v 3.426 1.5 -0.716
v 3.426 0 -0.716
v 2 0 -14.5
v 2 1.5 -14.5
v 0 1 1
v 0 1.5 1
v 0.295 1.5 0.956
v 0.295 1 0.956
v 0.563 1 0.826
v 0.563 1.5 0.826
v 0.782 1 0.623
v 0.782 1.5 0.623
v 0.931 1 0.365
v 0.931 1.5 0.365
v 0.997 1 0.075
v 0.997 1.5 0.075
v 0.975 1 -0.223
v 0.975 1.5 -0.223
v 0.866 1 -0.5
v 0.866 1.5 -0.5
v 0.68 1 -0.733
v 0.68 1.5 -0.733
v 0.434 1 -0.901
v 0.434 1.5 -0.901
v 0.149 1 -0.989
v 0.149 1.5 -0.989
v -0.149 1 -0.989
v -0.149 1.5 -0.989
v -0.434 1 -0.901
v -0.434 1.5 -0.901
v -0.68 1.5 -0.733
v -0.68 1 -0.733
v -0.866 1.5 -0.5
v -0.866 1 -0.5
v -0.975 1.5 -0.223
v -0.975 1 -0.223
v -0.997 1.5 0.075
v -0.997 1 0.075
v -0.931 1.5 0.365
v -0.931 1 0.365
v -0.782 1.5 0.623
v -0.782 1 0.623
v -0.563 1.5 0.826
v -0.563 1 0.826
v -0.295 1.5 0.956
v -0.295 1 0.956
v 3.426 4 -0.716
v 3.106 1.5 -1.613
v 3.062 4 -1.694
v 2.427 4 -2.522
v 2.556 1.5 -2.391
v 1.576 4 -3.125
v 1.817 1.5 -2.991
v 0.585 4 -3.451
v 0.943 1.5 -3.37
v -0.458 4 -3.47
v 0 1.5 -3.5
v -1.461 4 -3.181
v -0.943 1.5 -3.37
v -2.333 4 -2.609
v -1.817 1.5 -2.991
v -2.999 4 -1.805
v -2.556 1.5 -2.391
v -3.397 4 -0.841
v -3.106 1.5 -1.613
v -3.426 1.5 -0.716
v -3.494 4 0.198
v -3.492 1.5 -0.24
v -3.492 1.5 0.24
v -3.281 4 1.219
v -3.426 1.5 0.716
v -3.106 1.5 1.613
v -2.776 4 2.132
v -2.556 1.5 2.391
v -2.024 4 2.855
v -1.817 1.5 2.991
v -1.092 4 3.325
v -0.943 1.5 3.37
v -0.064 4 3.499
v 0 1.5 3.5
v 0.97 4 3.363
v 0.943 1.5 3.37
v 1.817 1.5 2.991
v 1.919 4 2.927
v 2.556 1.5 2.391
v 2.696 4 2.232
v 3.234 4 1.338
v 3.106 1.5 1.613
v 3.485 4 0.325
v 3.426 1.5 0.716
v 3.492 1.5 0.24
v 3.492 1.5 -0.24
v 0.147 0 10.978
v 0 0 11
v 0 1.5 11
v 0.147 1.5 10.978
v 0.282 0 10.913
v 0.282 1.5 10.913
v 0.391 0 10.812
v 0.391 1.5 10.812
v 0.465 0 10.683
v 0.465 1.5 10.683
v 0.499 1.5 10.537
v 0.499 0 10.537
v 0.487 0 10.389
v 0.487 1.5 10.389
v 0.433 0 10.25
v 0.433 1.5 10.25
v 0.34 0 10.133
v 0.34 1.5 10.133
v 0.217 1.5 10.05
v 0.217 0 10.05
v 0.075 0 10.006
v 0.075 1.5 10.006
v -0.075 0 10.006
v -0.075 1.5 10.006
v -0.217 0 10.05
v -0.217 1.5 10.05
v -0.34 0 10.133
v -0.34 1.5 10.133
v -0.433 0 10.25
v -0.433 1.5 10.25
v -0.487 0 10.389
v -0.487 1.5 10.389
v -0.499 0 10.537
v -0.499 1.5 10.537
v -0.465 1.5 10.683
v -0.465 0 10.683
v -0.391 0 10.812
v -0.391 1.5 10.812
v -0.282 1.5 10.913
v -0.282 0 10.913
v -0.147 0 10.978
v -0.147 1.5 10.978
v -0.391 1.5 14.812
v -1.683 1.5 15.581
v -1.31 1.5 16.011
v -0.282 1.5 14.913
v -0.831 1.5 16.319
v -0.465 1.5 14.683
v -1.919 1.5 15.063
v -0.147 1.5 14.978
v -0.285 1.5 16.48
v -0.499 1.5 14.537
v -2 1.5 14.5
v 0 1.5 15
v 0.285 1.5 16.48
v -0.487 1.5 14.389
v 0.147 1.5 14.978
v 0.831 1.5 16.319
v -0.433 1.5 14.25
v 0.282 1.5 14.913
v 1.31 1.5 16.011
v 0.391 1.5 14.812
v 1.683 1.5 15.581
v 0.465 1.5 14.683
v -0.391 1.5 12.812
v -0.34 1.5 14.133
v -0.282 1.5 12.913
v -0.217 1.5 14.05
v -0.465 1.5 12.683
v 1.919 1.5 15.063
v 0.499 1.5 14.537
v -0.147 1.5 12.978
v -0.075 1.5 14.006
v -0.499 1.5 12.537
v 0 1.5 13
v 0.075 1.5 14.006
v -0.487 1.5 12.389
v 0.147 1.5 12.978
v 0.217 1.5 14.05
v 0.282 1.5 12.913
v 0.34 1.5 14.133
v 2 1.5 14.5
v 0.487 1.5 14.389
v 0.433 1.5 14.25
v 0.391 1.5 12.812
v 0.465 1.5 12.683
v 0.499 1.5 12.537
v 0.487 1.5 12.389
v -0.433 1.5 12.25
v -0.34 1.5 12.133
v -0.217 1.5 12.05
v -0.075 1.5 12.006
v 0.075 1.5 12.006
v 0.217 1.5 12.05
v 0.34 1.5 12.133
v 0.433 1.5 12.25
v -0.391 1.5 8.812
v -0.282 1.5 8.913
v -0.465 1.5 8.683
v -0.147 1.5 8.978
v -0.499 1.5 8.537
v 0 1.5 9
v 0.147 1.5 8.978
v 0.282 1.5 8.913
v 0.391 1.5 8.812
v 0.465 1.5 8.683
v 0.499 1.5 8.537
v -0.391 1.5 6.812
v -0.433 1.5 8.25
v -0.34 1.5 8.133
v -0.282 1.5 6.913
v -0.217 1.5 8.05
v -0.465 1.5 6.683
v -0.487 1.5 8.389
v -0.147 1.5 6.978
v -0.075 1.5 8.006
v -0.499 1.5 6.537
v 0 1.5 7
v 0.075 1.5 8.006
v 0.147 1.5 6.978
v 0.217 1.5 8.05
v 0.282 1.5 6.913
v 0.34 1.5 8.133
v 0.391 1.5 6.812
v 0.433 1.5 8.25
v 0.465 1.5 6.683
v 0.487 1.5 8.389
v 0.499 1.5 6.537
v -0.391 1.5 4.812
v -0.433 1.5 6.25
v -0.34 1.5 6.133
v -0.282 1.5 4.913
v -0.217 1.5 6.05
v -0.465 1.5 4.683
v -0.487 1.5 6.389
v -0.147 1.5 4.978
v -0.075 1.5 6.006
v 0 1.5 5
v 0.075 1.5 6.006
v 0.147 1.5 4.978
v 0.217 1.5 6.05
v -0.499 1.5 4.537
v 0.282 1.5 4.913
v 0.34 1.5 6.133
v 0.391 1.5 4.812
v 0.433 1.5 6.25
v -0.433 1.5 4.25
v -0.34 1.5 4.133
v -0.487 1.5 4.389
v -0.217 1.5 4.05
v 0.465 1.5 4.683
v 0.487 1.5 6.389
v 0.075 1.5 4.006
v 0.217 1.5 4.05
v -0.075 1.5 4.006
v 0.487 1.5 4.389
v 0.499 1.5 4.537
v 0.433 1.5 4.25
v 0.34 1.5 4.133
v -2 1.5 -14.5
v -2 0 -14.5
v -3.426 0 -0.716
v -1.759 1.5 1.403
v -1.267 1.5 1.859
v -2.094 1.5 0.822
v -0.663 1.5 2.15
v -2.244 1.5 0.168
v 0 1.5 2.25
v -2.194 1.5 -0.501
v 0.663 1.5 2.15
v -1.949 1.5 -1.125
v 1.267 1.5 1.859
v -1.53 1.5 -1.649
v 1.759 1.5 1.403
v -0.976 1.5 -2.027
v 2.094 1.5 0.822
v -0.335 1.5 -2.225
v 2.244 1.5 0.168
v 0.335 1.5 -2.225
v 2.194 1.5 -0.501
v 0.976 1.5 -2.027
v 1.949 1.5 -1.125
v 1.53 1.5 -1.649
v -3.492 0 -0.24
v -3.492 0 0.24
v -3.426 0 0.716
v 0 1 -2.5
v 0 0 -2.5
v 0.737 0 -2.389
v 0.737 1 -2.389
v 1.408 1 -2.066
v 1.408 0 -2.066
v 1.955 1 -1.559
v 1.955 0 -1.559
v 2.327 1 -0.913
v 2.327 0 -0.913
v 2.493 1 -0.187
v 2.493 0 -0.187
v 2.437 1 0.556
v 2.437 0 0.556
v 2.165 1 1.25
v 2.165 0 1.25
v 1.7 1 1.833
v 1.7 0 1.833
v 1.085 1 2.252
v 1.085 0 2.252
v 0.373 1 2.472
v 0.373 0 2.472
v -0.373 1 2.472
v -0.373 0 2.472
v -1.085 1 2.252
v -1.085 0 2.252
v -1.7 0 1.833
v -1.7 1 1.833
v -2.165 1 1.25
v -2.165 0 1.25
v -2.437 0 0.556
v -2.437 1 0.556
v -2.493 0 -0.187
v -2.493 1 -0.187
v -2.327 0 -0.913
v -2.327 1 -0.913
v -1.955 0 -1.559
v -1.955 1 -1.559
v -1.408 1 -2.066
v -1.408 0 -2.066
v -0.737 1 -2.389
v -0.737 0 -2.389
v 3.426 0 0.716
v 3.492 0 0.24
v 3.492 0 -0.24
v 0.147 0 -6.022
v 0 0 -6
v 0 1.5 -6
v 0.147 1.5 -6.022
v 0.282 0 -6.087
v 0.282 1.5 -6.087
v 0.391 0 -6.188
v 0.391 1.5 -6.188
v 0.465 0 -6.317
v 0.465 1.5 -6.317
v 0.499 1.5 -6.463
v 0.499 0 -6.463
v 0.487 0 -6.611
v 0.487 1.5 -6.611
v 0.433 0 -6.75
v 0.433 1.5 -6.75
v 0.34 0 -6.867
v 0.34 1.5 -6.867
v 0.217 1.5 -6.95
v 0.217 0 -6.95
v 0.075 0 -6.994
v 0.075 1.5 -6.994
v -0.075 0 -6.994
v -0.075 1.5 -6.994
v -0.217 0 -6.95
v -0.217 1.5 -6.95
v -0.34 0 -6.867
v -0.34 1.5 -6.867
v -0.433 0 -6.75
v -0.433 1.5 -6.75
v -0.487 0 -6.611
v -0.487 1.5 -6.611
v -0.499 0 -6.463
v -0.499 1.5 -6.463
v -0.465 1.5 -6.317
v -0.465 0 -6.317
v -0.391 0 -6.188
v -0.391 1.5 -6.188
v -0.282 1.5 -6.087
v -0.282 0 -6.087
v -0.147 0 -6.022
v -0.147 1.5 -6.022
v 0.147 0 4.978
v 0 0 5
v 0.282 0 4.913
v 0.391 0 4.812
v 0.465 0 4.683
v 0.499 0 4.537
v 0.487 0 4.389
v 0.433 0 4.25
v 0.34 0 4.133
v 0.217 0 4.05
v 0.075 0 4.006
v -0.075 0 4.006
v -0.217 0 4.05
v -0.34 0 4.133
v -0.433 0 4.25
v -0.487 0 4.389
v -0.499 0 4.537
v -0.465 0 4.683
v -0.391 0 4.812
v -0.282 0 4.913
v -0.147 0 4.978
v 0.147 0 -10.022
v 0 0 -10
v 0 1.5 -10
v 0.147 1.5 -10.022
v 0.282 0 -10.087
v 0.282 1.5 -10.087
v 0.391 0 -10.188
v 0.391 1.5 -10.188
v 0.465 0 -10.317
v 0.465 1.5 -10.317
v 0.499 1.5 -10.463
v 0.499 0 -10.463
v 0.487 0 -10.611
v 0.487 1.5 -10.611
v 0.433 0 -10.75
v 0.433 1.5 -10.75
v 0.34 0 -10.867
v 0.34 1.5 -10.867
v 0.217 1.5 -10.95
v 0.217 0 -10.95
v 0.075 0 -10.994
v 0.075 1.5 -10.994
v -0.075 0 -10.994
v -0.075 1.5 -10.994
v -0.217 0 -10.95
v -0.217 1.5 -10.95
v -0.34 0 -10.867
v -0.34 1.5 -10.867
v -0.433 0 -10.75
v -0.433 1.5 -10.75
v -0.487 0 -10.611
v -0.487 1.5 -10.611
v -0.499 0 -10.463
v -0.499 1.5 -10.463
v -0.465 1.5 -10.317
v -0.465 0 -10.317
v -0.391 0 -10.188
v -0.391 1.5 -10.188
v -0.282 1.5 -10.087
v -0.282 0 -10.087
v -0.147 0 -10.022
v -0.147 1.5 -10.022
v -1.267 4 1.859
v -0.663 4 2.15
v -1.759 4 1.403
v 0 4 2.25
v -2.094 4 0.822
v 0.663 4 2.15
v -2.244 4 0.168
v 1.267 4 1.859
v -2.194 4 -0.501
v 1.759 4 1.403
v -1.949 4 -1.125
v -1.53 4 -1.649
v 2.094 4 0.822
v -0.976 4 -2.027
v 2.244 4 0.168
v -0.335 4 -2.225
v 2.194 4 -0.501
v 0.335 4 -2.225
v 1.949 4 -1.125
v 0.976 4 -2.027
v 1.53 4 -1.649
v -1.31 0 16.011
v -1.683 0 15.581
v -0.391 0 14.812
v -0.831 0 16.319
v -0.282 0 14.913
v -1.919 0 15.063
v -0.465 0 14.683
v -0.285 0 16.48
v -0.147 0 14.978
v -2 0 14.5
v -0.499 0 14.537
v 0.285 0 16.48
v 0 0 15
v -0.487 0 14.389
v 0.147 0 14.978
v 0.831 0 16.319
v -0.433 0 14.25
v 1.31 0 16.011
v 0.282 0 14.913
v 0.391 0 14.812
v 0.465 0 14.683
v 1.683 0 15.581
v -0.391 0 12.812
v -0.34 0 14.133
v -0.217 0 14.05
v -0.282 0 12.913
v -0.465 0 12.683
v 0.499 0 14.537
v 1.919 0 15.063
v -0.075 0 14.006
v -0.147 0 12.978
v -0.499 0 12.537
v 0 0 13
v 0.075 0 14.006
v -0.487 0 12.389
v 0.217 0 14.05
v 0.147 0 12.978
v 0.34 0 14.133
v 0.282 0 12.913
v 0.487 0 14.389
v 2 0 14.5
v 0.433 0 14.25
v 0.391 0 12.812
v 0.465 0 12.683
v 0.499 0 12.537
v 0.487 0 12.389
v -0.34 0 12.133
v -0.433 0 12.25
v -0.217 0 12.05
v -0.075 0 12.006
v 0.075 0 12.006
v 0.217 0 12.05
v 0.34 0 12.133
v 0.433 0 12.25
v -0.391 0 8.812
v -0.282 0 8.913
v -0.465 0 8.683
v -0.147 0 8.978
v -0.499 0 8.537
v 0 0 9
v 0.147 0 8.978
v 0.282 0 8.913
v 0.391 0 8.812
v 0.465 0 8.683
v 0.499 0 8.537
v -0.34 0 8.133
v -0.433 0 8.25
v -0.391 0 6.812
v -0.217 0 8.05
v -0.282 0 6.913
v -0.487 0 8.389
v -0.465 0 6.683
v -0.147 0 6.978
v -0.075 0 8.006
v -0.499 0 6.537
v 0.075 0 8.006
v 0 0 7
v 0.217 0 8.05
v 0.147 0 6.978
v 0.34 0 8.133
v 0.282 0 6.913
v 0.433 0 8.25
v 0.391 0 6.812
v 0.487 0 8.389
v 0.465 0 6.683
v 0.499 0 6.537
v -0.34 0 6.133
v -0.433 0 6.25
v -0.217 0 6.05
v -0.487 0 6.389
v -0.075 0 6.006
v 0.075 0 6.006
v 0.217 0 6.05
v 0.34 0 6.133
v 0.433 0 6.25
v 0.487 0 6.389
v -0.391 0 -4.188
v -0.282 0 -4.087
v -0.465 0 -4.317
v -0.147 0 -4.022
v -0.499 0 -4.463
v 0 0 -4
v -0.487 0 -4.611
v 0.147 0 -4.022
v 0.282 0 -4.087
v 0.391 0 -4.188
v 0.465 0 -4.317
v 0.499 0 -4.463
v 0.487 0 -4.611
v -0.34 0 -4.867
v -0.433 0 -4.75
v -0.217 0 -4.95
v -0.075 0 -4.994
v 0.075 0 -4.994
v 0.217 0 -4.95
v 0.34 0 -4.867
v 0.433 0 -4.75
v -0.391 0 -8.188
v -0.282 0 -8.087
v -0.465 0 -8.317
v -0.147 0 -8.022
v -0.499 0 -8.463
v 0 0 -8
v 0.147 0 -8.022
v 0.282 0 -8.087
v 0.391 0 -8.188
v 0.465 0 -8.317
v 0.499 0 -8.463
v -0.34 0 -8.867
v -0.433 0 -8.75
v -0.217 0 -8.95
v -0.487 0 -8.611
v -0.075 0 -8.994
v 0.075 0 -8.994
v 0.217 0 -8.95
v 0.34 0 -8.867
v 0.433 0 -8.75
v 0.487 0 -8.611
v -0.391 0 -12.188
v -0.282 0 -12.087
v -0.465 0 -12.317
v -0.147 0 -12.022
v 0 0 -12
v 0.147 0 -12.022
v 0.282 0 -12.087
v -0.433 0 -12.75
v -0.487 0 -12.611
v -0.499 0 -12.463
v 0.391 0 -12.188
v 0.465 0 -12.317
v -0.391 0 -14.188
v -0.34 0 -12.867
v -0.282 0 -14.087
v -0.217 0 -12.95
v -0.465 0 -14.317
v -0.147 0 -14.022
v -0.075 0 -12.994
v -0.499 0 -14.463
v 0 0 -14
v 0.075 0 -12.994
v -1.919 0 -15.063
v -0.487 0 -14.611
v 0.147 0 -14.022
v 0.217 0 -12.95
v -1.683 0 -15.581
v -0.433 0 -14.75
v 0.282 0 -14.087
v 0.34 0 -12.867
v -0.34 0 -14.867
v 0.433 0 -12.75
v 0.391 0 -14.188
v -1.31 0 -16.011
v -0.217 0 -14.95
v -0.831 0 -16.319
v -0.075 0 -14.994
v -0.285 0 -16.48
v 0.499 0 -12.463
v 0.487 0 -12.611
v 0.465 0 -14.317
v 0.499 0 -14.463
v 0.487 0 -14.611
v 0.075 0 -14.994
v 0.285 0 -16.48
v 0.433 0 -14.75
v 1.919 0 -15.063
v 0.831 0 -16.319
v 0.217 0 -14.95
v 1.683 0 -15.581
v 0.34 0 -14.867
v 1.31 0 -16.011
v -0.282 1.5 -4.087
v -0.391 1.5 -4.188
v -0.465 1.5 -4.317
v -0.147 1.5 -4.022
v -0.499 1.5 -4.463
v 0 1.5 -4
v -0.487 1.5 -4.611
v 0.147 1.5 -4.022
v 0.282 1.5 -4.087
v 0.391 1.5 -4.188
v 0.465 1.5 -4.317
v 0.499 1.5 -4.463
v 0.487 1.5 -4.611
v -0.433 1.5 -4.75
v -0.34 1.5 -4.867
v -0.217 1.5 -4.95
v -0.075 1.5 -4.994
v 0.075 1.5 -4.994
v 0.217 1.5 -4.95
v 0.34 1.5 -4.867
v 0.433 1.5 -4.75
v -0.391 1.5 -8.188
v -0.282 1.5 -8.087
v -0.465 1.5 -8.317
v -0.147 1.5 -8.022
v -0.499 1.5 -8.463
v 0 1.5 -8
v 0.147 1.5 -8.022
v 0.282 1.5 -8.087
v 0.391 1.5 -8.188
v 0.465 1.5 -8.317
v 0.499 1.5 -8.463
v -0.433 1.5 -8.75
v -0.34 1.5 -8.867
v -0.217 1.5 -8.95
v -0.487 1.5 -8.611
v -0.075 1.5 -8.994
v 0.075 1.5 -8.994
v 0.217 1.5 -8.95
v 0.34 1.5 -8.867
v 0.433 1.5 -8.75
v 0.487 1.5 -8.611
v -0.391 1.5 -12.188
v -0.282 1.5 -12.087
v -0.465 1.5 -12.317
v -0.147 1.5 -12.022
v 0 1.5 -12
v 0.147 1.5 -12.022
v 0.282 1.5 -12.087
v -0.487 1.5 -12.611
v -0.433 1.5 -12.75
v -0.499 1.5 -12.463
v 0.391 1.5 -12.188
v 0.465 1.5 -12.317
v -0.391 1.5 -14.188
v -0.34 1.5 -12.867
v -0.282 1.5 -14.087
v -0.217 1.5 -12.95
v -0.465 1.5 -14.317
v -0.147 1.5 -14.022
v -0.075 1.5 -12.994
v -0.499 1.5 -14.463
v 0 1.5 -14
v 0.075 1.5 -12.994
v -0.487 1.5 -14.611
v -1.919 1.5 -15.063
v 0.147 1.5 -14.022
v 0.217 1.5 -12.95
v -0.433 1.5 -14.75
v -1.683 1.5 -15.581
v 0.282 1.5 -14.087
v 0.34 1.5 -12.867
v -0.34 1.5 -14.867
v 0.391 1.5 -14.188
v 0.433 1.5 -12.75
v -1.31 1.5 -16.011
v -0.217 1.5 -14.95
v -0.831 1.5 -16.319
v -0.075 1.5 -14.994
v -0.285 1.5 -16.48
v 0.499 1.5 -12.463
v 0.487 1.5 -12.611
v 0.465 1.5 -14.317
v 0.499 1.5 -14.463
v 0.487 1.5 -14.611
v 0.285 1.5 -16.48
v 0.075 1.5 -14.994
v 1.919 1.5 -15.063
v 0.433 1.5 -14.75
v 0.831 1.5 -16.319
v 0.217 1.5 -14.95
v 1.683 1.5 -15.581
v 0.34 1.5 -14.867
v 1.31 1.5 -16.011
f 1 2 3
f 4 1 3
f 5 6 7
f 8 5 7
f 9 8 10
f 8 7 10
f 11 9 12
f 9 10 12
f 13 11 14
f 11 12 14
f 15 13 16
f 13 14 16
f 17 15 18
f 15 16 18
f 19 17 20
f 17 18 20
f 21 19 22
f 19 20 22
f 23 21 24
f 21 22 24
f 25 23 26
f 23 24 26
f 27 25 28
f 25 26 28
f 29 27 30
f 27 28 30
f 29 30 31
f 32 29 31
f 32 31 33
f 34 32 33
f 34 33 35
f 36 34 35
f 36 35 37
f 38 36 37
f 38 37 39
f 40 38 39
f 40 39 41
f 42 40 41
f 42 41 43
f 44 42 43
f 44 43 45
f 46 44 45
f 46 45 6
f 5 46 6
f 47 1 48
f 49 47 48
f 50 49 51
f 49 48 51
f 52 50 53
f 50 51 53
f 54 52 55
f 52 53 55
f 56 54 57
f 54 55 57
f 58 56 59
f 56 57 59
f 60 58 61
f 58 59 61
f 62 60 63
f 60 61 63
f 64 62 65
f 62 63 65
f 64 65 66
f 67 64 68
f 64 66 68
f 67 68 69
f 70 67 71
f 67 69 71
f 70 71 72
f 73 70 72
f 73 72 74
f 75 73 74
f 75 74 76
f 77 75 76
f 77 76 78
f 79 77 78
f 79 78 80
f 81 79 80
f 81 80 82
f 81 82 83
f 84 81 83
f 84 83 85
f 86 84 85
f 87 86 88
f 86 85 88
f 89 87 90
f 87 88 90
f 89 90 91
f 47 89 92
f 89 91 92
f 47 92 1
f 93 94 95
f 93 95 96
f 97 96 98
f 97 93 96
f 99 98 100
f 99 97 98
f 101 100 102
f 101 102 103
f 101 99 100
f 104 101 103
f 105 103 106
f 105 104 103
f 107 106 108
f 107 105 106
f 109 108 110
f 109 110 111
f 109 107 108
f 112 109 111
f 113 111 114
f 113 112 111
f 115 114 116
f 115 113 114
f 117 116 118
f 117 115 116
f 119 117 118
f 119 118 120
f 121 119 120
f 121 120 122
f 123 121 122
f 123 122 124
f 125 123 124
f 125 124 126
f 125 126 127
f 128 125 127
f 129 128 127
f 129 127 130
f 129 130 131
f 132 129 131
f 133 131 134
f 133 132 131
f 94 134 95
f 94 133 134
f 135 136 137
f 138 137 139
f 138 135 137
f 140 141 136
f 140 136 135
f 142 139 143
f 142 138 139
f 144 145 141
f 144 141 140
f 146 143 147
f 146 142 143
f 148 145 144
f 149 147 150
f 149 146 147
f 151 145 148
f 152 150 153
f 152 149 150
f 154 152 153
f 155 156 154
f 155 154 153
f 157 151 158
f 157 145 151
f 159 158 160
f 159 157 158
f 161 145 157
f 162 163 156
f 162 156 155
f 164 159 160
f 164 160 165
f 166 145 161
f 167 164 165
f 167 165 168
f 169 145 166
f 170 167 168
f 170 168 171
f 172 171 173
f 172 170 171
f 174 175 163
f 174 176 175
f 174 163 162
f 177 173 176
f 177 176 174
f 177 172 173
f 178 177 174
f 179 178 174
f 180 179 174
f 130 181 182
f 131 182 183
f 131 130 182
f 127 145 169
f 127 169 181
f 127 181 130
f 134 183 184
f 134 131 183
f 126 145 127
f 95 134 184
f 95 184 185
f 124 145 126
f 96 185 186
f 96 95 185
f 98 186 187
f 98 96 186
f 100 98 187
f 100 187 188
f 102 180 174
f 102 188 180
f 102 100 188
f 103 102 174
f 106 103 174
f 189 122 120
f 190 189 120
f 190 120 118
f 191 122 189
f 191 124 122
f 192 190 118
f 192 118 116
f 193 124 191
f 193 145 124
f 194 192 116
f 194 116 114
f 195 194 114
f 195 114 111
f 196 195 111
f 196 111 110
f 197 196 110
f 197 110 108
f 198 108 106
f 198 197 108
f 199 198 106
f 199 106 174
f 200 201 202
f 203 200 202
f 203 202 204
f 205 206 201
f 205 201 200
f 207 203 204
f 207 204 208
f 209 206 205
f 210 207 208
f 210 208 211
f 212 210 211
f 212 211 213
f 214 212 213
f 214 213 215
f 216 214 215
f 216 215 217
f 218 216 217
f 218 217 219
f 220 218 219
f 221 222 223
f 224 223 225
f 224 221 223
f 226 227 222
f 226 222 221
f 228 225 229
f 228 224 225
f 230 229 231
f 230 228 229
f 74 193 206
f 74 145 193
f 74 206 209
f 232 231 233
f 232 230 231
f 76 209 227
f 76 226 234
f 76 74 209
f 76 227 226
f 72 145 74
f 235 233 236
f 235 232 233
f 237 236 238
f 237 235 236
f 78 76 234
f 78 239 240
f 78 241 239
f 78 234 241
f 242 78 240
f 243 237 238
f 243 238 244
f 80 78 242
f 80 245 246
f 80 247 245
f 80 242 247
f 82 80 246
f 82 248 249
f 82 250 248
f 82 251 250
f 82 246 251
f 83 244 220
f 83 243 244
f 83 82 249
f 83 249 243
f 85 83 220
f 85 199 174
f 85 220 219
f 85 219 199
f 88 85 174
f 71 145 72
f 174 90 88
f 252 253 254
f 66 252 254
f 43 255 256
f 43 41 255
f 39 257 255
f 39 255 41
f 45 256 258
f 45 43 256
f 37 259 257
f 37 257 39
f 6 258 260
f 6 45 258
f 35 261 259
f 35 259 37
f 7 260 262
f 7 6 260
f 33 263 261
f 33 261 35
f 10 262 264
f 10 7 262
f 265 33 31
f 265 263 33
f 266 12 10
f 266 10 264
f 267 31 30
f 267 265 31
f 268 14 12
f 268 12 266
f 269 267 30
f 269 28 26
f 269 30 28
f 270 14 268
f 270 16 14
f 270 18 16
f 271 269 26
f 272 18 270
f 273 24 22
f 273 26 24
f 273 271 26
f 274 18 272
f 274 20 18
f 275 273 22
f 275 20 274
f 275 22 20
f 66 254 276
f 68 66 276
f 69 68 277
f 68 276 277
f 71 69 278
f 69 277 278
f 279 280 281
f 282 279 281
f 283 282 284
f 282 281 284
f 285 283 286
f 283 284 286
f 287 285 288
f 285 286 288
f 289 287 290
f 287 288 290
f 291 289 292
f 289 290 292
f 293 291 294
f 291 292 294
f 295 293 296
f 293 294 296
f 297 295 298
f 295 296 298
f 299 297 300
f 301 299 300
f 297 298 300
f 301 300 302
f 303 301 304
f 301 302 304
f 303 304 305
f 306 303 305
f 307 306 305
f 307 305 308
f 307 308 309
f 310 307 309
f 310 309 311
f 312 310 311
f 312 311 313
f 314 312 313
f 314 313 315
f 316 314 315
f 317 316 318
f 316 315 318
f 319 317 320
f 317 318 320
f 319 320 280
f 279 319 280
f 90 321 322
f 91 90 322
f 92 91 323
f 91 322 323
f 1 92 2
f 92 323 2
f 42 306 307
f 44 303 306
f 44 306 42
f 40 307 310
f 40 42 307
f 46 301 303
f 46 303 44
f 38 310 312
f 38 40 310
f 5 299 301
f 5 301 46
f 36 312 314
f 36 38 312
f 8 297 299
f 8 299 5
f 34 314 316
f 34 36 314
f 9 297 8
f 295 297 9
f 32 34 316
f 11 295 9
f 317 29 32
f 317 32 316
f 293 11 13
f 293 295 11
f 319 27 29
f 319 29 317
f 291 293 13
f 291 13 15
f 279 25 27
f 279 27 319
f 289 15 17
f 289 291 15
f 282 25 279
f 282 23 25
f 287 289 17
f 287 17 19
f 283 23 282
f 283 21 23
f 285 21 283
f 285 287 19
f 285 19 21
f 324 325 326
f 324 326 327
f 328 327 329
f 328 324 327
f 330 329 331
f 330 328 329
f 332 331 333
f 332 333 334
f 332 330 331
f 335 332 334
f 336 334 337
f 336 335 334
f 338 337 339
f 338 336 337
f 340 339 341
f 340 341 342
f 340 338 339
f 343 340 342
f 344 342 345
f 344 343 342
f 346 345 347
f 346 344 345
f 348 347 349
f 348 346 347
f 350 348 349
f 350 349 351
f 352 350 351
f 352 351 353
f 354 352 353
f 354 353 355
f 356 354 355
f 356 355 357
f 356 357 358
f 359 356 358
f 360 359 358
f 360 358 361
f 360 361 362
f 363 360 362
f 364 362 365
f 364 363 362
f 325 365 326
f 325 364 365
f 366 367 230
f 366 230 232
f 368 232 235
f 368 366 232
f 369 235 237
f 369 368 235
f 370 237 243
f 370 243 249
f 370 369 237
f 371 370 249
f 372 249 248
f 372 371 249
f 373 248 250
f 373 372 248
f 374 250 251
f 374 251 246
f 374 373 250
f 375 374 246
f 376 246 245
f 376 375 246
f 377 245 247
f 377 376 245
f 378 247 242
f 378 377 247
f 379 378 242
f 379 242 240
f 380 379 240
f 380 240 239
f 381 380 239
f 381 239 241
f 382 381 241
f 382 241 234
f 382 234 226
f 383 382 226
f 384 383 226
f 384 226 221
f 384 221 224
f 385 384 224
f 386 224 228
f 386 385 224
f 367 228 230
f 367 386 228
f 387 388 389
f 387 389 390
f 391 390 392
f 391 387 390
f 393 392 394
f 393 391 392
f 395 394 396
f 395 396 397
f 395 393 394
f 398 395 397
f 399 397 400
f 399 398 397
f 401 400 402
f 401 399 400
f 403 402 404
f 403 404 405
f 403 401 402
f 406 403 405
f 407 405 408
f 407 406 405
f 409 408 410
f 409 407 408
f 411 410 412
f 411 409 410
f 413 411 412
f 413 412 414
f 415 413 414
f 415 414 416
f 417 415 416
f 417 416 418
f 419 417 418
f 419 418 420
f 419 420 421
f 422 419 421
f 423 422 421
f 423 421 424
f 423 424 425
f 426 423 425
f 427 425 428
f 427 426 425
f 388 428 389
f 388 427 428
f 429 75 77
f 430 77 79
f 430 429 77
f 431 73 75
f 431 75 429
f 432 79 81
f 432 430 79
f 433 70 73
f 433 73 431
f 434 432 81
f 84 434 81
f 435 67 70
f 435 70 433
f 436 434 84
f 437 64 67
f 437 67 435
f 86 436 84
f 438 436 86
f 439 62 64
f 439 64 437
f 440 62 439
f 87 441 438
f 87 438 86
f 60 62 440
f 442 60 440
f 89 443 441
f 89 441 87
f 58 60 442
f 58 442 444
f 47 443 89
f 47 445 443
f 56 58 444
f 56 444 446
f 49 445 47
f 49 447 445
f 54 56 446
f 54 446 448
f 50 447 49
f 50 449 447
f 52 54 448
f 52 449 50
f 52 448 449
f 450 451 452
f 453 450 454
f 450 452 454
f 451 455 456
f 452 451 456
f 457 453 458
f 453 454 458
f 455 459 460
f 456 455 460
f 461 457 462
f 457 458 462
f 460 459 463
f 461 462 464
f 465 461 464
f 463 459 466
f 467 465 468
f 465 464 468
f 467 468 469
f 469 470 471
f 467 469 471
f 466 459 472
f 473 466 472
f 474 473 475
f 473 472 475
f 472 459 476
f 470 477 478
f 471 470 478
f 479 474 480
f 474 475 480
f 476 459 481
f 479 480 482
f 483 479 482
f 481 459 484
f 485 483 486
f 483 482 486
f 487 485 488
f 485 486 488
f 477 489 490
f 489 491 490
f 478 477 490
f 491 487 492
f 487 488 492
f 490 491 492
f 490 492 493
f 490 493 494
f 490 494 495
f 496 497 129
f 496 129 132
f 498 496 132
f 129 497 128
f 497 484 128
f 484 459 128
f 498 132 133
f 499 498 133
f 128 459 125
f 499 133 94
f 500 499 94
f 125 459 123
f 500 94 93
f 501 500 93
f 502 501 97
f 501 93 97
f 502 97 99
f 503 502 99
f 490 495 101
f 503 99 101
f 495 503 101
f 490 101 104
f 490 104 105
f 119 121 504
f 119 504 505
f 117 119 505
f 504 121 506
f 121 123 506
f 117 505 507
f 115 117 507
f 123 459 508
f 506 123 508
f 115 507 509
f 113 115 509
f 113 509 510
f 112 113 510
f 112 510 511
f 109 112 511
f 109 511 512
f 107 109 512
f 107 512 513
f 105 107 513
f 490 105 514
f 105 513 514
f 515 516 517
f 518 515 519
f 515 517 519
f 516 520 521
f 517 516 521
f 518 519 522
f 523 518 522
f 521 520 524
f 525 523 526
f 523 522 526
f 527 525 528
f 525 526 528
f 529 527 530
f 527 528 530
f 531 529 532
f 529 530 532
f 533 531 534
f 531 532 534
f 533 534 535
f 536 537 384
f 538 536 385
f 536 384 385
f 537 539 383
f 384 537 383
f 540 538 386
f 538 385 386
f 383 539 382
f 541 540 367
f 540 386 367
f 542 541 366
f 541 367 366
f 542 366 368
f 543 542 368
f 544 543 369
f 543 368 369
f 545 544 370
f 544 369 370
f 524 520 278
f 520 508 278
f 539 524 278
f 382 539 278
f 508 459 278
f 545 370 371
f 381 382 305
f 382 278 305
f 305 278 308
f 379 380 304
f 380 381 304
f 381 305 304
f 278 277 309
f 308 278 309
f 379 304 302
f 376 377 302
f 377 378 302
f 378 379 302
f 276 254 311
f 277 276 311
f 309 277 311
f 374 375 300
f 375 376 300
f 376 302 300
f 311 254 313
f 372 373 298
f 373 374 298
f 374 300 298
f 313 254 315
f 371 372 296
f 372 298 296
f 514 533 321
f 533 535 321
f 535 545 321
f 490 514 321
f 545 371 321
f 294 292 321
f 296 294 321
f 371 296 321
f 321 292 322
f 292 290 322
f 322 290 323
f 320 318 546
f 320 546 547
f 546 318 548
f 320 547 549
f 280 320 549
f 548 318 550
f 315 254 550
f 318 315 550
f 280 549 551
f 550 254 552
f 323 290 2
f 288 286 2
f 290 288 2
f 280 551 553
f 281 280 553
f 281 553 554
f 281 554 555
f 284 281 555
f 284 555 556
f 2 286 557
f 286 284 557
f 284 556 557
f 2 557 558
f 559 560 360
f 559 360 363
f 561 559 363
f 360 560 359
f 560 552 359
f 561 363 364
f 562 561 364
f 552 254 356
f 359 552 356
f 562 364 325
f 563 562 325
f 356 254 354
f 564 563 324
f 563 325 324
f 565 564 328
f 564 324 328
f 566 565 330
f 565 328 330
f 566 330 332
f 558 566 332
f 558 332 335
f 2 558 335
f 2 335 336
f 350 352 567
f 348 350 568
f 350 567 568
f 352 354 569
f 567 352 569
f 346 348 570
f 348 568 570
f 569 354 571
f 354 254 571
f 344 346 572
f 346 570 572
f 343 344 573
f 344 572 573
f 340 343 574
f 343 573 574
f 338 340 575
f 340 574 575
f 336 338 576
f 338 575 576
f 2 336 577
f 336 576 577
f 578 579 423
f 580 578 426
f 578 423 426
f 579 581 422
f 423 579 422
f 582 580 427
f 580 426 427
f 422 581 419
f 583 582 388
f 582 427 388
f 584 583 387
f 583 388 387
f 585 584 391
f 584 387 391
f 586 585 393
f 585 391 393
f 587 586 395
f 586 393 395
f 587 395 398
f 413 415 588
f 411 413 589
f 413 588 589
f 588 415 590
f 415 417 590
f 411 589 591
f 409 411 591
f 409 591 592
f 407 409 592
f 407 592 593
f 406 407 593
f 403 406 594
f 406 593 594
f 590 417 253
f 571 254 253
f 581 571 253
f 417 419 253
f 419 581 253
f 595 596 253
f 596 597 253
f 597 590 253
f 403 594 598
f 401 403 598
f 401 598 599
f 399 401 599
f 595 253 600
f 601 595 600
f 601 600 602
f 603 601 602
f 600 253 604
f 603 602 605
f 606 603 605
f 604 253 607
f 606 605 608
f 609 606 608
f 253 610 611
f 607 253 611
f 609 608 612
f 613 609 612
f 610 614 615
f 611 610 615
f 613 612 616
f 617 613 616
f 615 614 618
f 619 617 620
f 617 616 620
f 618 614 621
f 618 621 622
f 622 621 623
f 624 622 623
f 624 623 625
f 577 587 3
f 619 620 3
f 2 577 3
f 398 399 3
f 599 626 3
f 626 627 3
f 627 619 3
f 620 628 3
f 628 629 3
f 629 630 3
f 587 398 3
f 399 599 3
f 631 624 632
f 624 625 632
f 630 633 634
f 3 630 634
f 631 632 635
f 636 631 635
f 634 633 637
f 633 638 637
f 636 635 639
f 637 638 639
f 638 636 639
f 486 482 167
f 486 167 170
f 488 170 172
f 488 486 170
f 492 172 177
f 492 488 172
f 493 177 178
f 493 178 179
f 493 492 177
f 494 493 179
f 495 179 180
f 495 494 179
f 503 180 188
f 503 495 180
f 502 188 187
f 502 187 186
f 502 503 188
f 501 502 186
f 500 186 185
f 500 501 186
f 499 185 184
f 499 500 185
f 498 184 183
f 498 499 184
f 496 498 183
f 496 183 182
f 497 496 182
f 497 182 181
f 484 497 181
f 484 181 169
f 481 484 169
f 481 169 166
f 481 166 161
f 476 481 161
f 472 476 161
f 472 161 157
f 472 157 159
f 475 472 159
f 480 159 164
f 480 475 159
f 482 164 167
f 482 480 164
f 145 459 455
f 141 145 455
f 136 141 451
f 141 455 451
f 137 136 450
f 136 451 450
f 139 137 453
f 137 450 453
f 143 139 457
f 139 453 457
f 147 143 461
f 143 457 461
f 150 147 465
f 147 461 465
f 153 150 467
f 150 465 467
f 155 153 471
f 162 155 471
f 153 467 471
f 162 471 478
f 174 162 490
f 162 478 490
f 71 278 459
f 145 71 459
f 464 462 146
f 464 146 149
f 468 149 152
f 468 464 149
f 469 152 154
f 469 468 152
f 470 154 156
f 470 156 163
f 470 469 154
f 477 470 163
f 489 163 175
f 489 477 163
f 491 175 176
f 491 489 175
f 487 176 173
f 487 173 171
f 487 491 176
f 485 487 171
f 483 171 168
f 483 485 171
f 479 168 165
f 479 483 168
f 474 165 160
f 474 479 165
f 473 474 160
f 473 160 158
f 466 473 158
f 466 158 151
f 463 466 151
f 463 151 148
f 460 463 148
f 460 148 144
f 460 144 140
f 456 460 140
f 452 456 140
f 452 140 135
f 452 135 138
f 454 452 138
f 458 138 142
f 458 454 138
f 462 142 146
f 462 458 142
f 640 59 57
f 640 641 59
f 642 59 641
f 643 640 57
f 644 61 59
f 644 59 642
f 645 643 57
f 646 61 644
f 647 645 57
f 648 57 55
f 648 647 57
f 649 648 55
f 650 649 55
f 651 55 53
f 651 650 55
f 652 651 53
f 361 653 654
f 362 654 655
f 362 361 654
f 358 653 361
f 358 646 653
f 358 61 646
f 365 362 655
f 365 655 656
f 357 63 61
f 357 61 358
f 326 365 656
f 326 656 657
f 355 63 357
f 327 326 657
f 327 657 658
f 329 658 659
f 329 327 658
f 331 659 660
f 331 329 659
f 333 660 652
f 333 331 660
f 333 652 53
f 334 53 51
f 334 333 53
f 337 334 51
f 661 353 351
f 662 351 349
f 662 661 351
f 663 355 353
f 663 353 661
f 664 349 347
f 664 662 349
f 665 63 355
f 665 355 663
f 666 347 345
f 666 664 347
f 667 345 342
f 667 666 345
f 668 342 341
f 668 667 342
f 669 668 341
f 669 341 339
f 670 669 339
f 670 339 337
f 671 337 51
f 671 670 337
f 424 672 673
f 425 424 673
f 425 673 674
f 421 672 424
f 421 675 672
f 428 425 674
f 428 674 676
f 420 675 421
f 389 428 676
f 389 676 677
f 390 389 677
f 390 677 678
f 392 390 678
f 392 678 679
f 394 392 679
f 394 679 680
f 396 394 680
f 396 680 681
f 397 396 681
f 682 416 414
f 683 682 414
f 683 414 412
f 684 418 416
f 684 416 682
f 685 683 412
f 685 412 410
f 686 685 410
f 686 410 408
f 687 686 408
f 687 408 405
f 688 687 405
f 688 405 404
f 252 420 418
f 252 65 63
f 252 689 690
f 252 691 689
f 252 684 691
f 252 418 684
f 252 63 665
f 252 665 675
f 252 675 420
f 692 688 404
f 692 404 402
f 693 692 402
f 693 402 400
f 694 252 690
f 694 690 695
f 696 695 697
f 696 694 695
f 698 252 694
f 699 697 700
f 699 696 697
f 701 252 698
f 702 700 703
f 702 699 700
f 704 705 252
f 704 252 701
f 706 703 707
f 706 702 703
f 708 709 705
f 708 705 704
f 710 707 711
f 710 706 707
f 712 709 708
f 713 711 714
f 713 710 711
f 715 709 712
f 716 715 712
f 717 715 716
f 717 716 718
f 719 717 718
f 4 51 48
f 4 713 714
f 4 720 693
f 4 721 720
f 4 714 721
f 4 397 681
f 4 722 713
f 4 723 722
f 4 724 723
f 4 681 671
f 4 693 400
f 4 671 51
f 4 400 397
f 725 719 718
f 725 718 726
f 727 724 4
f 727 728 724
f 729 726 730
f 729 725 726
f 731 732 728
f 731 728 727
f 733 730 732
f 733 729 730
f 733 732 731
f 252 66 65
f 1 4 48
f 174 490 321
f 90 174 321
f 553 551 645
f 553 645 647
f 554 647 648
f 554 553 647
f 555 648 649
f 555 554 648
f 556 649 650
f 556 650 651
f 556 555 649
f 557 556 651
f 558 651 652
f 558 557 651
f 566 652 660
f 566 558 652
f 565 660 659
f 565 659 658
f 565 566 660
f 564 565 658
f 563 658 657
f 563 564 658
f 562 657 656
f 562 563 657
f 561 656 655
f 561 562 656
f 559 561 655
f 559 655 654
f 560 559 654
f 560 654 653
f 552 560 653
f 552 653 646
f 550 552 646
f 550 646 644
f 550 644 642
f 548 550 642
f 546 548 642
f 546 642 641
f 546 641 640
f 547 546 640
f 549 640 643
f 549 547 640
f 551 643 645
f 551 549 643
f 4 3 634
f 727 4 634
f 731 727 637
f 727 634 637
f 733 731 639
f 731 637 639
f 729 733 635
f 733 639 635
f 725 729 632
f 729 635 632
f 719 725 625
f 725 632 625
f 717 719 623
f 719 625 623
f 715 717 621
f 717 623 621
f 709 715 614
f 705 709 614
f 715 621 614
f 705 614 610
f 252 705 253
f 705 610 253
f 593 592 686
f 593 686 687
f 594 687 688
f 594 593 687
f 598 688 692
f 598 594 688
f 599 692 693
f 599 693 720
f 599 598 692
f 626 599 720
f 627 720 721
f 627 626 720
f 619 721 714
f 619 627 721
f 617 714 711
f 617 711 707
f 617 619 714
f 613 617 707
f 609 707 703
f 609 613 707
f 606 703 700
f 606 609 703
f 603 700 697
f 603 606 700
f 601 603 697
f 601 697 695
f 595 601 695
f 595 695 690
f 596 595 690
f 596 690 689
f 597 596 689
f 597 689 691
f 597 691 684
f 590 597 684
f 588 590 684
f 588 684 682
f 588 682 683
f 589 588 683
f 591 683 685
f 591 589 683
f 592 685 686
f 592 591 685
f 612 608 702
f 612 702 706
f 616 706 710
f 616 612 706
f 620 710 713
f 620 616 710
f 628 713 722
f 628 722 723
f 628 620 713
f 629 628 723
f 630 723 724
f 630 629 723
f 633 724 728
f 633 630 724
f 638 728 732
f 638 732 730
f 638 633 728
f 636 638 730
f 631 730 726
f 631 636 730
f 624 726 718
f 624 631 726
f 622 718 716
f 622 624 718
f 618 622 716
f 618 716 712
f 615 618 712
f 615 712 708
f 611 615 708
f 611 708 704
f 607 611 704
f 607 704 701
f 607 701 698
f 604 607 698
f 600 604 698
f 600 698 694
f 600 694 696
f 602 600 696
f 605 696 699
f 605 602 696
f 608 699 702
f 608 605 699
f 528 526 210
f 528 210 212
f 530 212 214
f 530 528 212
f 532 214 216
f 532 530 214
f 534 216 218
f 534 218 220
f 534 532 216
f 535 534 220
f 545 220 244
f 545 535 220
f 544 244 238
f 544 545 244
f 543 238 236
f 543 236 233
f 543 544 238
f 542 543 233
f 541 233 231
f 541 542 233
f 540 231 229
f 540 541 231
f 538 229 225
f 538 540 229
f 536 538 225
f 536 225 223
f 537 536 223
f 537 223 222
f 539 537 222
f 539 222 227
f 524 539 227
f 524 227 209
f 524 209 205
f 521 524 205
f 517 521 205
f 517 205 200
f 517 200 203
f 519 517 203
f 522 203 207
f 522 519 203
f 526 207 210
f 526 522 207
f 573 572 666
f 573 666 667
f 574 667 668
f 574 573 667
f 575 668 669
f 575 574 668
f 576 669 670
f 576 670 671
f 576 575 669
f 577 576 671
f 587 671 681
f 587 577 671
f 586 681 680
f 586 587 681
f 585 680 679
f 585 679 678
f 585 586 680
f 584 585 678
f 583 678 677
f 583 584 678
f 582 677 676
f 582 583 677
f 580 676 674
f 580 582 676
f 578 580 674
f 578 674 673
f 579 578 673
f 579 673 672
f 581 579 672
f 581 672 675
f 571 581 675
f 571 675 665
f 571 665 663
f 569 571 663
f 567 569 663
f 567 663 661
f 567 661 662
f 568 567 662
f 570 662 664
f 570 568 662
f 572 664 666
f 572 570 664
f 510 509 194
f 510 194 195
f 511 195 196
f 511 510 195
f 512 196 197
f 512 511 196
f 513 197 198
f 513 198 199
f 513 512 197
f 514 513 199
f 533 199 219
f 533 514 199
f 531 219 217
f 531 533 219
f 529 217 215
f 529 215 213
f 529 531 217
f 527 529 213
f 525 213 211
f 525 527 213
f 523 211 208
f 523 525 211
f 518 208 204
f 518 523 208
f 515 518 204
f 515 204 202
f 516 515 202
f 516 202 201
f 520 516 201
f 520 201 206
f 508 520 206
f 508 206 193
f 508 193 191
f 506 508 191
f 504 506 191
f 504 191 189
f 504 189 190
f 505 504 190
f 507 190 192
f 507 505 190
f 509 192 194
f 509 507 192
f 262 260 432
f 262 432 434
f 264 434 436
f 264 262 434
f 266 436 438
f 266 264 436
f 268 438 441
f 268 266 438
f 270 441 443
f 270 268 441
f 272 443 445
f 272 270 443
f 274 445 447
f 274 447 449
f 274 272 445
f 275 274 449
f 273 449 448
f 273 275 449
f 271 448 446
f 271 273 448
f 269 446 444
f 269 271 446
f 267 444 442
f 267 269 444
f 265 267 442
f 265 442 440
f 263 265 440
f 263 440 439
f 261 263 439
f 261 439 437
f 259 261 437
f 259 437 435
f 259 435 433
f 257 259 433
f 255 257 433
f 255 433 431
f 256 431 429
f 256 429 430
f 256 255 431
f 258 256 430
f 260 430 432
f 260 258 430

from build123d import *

# Parameters (mm, degrees)
CROQUIS1_R              = 0.5
SALIENTE_EXTRUIR1_DEPTH = 1.5
CROQUIS2_R              = 3.5
CROQUIS2_R_2            = 2.25
SALIENTE_EXTRUIR2_DEPTH = 2.5
CROQUIS3_R              = 2.5
CORTAR_EXTRUIR1_DEPTH   = 1
CROQUIS4_R              = 1
CORTAR_EXTRUIR2_DEPTH   = 1


with BuildPart() as part:
    # Croquis1 → Saliente-Extruir1 (new body)
    with BuildSketch(Plane(origin=(0, 0, 0), x_dir=(1, 0, 0), z_dir=(0, 1, 0))):
        with BuildLine():
            Line((-3.425882353, -0.716470588), (-2, -14.5))
            ThreePointArc((-2, -14.5), (0, -16.5), (2, -14.5))
            Line((2, -14.5), (3.425882353, -0.716470588))
            ThreePointArc((3.425882353, -0.716470588), (3.5, 0), (3.425882353, 0.716470588))
            Line((3.425882353, 0.716470588), (2, 14.5))
            ThreePointArc((2, 14.5), (0, 16.5), (-2, 14.5))
            Line((-2, 14.5), (-3.425882353, 0.716470588))
            ThreePointArc((-3.425882353, 0.716470588), (-3.5, 0), (-3.425882353, -0.716470588))
        make_face()
        with Locations(Location((0, -14.5, 0), (0, 0, 270))):
            Circle(CROQUIS1_R, mode=Mode.SUBTRACT)
        with Locations(Location((0, -12.5, 0), (0, 0, 270))):
            Circle(CROQUIS1_R, mode=Mode.SUBTRACT)
        with Locations(Location((0, -10.5, 0), (0, 0, 270))):
            Circle(CROQUIS1_R, mode=Mode.SUBTRACT)
        with Locations(Location((0, -8.5, 0), (0, 0, 270))):
            Circle(CROQUIS1_R, mode=Mode.SUBTRACT)
        with Locations(Location((0, -6.5, 0), (0, 0, 270))):
            Circle(CROQUIS1_R, mode=Mode.SUBTRACT)
        with Locations(Location((0, -4.5, 0), (0, 0, 270))):
            Circle(CROQUIS1_R, mode=Mode.SUBTRACT)
        with Locations(Location((0, 14.5, 0), (0, 0, 270))):
            Circle(CROQUIS1_R, mode=Mode.SUBTRACT)
        with Locations(Location((0, 12.5, 0), (0, 0, 270))):
            Circle(CROQUIS1_R, mode=Mode.SUBTRACT)
        with Locations(Location((0, 10.5, 0), (0, 0, 270))):
            Circle(CROQUIS1_R, mode=Mode.SUBTRACT)
        with Locations(Location((0, 8.5, 0), (0, 0, 270))):
            Circle(CROQUIS1_R, mode=Mode.SUBTRACT)
        with Locations(Location((0, 6.5, 0), (0, 0, 270))):
            Circle(CROQUIS1_R, mode=Mode.SUBTRACT)
        with Locations(Location((0, 4.5, 0), (0, 0, 270))):
            Circle(CROQUIS1_R, mode=Mode.SUBTRACT)
    extrude(amount=SALIENTE_EXTRUIR1_DEPTH)

    # Croquis2 → Saliente-Extruir2 (add)
    with BuildSketch(Plane(origin=(0, 1.5, 0), x_dir=(1, 0, 0), z_dir=(0, 1, 0))):
        with Locations(Location((0, 0, 0), (0, 0, 11.812282228))):
            Circle(CROQUIS2_R)
        with Locations(Location((0, 0, 0), (0, 0, 270))):
            Circle(CROQUIS2_R_2, mode=Mode.SUBTRACT)
    extrude(amount=SALIENTE_EXTRUIR2_DEPTH)

    # Croquis3 → Cortar-Extruir1 (cut)
    with BuildSketch(Plane.XZ):
        with Locations(Location((0, 0, 0), (0, 0, 270))):
            Circle(CROQUIS3_R)
    extrude(amount=-CORTAR_EXTRUIR1_DEPTH, mode=Mode.SUBTRACT)

    # Croquis4 → Cortar-Extruir2 (cut)
    with BuildSketch(Plane(origin=(0, 1.5, 0), x_dir=(1, 0, 0), z_dir=(0, 1, 0))):
        with Locations(Location((0, 0, 0), (0, 0, 270))):
            Circle(CROQUIS4_R)
    extrude(amount=-CORTAR_EXTRUIR2_DEPTH, mode=Mode.SUBTRACT)


solid = part.part
